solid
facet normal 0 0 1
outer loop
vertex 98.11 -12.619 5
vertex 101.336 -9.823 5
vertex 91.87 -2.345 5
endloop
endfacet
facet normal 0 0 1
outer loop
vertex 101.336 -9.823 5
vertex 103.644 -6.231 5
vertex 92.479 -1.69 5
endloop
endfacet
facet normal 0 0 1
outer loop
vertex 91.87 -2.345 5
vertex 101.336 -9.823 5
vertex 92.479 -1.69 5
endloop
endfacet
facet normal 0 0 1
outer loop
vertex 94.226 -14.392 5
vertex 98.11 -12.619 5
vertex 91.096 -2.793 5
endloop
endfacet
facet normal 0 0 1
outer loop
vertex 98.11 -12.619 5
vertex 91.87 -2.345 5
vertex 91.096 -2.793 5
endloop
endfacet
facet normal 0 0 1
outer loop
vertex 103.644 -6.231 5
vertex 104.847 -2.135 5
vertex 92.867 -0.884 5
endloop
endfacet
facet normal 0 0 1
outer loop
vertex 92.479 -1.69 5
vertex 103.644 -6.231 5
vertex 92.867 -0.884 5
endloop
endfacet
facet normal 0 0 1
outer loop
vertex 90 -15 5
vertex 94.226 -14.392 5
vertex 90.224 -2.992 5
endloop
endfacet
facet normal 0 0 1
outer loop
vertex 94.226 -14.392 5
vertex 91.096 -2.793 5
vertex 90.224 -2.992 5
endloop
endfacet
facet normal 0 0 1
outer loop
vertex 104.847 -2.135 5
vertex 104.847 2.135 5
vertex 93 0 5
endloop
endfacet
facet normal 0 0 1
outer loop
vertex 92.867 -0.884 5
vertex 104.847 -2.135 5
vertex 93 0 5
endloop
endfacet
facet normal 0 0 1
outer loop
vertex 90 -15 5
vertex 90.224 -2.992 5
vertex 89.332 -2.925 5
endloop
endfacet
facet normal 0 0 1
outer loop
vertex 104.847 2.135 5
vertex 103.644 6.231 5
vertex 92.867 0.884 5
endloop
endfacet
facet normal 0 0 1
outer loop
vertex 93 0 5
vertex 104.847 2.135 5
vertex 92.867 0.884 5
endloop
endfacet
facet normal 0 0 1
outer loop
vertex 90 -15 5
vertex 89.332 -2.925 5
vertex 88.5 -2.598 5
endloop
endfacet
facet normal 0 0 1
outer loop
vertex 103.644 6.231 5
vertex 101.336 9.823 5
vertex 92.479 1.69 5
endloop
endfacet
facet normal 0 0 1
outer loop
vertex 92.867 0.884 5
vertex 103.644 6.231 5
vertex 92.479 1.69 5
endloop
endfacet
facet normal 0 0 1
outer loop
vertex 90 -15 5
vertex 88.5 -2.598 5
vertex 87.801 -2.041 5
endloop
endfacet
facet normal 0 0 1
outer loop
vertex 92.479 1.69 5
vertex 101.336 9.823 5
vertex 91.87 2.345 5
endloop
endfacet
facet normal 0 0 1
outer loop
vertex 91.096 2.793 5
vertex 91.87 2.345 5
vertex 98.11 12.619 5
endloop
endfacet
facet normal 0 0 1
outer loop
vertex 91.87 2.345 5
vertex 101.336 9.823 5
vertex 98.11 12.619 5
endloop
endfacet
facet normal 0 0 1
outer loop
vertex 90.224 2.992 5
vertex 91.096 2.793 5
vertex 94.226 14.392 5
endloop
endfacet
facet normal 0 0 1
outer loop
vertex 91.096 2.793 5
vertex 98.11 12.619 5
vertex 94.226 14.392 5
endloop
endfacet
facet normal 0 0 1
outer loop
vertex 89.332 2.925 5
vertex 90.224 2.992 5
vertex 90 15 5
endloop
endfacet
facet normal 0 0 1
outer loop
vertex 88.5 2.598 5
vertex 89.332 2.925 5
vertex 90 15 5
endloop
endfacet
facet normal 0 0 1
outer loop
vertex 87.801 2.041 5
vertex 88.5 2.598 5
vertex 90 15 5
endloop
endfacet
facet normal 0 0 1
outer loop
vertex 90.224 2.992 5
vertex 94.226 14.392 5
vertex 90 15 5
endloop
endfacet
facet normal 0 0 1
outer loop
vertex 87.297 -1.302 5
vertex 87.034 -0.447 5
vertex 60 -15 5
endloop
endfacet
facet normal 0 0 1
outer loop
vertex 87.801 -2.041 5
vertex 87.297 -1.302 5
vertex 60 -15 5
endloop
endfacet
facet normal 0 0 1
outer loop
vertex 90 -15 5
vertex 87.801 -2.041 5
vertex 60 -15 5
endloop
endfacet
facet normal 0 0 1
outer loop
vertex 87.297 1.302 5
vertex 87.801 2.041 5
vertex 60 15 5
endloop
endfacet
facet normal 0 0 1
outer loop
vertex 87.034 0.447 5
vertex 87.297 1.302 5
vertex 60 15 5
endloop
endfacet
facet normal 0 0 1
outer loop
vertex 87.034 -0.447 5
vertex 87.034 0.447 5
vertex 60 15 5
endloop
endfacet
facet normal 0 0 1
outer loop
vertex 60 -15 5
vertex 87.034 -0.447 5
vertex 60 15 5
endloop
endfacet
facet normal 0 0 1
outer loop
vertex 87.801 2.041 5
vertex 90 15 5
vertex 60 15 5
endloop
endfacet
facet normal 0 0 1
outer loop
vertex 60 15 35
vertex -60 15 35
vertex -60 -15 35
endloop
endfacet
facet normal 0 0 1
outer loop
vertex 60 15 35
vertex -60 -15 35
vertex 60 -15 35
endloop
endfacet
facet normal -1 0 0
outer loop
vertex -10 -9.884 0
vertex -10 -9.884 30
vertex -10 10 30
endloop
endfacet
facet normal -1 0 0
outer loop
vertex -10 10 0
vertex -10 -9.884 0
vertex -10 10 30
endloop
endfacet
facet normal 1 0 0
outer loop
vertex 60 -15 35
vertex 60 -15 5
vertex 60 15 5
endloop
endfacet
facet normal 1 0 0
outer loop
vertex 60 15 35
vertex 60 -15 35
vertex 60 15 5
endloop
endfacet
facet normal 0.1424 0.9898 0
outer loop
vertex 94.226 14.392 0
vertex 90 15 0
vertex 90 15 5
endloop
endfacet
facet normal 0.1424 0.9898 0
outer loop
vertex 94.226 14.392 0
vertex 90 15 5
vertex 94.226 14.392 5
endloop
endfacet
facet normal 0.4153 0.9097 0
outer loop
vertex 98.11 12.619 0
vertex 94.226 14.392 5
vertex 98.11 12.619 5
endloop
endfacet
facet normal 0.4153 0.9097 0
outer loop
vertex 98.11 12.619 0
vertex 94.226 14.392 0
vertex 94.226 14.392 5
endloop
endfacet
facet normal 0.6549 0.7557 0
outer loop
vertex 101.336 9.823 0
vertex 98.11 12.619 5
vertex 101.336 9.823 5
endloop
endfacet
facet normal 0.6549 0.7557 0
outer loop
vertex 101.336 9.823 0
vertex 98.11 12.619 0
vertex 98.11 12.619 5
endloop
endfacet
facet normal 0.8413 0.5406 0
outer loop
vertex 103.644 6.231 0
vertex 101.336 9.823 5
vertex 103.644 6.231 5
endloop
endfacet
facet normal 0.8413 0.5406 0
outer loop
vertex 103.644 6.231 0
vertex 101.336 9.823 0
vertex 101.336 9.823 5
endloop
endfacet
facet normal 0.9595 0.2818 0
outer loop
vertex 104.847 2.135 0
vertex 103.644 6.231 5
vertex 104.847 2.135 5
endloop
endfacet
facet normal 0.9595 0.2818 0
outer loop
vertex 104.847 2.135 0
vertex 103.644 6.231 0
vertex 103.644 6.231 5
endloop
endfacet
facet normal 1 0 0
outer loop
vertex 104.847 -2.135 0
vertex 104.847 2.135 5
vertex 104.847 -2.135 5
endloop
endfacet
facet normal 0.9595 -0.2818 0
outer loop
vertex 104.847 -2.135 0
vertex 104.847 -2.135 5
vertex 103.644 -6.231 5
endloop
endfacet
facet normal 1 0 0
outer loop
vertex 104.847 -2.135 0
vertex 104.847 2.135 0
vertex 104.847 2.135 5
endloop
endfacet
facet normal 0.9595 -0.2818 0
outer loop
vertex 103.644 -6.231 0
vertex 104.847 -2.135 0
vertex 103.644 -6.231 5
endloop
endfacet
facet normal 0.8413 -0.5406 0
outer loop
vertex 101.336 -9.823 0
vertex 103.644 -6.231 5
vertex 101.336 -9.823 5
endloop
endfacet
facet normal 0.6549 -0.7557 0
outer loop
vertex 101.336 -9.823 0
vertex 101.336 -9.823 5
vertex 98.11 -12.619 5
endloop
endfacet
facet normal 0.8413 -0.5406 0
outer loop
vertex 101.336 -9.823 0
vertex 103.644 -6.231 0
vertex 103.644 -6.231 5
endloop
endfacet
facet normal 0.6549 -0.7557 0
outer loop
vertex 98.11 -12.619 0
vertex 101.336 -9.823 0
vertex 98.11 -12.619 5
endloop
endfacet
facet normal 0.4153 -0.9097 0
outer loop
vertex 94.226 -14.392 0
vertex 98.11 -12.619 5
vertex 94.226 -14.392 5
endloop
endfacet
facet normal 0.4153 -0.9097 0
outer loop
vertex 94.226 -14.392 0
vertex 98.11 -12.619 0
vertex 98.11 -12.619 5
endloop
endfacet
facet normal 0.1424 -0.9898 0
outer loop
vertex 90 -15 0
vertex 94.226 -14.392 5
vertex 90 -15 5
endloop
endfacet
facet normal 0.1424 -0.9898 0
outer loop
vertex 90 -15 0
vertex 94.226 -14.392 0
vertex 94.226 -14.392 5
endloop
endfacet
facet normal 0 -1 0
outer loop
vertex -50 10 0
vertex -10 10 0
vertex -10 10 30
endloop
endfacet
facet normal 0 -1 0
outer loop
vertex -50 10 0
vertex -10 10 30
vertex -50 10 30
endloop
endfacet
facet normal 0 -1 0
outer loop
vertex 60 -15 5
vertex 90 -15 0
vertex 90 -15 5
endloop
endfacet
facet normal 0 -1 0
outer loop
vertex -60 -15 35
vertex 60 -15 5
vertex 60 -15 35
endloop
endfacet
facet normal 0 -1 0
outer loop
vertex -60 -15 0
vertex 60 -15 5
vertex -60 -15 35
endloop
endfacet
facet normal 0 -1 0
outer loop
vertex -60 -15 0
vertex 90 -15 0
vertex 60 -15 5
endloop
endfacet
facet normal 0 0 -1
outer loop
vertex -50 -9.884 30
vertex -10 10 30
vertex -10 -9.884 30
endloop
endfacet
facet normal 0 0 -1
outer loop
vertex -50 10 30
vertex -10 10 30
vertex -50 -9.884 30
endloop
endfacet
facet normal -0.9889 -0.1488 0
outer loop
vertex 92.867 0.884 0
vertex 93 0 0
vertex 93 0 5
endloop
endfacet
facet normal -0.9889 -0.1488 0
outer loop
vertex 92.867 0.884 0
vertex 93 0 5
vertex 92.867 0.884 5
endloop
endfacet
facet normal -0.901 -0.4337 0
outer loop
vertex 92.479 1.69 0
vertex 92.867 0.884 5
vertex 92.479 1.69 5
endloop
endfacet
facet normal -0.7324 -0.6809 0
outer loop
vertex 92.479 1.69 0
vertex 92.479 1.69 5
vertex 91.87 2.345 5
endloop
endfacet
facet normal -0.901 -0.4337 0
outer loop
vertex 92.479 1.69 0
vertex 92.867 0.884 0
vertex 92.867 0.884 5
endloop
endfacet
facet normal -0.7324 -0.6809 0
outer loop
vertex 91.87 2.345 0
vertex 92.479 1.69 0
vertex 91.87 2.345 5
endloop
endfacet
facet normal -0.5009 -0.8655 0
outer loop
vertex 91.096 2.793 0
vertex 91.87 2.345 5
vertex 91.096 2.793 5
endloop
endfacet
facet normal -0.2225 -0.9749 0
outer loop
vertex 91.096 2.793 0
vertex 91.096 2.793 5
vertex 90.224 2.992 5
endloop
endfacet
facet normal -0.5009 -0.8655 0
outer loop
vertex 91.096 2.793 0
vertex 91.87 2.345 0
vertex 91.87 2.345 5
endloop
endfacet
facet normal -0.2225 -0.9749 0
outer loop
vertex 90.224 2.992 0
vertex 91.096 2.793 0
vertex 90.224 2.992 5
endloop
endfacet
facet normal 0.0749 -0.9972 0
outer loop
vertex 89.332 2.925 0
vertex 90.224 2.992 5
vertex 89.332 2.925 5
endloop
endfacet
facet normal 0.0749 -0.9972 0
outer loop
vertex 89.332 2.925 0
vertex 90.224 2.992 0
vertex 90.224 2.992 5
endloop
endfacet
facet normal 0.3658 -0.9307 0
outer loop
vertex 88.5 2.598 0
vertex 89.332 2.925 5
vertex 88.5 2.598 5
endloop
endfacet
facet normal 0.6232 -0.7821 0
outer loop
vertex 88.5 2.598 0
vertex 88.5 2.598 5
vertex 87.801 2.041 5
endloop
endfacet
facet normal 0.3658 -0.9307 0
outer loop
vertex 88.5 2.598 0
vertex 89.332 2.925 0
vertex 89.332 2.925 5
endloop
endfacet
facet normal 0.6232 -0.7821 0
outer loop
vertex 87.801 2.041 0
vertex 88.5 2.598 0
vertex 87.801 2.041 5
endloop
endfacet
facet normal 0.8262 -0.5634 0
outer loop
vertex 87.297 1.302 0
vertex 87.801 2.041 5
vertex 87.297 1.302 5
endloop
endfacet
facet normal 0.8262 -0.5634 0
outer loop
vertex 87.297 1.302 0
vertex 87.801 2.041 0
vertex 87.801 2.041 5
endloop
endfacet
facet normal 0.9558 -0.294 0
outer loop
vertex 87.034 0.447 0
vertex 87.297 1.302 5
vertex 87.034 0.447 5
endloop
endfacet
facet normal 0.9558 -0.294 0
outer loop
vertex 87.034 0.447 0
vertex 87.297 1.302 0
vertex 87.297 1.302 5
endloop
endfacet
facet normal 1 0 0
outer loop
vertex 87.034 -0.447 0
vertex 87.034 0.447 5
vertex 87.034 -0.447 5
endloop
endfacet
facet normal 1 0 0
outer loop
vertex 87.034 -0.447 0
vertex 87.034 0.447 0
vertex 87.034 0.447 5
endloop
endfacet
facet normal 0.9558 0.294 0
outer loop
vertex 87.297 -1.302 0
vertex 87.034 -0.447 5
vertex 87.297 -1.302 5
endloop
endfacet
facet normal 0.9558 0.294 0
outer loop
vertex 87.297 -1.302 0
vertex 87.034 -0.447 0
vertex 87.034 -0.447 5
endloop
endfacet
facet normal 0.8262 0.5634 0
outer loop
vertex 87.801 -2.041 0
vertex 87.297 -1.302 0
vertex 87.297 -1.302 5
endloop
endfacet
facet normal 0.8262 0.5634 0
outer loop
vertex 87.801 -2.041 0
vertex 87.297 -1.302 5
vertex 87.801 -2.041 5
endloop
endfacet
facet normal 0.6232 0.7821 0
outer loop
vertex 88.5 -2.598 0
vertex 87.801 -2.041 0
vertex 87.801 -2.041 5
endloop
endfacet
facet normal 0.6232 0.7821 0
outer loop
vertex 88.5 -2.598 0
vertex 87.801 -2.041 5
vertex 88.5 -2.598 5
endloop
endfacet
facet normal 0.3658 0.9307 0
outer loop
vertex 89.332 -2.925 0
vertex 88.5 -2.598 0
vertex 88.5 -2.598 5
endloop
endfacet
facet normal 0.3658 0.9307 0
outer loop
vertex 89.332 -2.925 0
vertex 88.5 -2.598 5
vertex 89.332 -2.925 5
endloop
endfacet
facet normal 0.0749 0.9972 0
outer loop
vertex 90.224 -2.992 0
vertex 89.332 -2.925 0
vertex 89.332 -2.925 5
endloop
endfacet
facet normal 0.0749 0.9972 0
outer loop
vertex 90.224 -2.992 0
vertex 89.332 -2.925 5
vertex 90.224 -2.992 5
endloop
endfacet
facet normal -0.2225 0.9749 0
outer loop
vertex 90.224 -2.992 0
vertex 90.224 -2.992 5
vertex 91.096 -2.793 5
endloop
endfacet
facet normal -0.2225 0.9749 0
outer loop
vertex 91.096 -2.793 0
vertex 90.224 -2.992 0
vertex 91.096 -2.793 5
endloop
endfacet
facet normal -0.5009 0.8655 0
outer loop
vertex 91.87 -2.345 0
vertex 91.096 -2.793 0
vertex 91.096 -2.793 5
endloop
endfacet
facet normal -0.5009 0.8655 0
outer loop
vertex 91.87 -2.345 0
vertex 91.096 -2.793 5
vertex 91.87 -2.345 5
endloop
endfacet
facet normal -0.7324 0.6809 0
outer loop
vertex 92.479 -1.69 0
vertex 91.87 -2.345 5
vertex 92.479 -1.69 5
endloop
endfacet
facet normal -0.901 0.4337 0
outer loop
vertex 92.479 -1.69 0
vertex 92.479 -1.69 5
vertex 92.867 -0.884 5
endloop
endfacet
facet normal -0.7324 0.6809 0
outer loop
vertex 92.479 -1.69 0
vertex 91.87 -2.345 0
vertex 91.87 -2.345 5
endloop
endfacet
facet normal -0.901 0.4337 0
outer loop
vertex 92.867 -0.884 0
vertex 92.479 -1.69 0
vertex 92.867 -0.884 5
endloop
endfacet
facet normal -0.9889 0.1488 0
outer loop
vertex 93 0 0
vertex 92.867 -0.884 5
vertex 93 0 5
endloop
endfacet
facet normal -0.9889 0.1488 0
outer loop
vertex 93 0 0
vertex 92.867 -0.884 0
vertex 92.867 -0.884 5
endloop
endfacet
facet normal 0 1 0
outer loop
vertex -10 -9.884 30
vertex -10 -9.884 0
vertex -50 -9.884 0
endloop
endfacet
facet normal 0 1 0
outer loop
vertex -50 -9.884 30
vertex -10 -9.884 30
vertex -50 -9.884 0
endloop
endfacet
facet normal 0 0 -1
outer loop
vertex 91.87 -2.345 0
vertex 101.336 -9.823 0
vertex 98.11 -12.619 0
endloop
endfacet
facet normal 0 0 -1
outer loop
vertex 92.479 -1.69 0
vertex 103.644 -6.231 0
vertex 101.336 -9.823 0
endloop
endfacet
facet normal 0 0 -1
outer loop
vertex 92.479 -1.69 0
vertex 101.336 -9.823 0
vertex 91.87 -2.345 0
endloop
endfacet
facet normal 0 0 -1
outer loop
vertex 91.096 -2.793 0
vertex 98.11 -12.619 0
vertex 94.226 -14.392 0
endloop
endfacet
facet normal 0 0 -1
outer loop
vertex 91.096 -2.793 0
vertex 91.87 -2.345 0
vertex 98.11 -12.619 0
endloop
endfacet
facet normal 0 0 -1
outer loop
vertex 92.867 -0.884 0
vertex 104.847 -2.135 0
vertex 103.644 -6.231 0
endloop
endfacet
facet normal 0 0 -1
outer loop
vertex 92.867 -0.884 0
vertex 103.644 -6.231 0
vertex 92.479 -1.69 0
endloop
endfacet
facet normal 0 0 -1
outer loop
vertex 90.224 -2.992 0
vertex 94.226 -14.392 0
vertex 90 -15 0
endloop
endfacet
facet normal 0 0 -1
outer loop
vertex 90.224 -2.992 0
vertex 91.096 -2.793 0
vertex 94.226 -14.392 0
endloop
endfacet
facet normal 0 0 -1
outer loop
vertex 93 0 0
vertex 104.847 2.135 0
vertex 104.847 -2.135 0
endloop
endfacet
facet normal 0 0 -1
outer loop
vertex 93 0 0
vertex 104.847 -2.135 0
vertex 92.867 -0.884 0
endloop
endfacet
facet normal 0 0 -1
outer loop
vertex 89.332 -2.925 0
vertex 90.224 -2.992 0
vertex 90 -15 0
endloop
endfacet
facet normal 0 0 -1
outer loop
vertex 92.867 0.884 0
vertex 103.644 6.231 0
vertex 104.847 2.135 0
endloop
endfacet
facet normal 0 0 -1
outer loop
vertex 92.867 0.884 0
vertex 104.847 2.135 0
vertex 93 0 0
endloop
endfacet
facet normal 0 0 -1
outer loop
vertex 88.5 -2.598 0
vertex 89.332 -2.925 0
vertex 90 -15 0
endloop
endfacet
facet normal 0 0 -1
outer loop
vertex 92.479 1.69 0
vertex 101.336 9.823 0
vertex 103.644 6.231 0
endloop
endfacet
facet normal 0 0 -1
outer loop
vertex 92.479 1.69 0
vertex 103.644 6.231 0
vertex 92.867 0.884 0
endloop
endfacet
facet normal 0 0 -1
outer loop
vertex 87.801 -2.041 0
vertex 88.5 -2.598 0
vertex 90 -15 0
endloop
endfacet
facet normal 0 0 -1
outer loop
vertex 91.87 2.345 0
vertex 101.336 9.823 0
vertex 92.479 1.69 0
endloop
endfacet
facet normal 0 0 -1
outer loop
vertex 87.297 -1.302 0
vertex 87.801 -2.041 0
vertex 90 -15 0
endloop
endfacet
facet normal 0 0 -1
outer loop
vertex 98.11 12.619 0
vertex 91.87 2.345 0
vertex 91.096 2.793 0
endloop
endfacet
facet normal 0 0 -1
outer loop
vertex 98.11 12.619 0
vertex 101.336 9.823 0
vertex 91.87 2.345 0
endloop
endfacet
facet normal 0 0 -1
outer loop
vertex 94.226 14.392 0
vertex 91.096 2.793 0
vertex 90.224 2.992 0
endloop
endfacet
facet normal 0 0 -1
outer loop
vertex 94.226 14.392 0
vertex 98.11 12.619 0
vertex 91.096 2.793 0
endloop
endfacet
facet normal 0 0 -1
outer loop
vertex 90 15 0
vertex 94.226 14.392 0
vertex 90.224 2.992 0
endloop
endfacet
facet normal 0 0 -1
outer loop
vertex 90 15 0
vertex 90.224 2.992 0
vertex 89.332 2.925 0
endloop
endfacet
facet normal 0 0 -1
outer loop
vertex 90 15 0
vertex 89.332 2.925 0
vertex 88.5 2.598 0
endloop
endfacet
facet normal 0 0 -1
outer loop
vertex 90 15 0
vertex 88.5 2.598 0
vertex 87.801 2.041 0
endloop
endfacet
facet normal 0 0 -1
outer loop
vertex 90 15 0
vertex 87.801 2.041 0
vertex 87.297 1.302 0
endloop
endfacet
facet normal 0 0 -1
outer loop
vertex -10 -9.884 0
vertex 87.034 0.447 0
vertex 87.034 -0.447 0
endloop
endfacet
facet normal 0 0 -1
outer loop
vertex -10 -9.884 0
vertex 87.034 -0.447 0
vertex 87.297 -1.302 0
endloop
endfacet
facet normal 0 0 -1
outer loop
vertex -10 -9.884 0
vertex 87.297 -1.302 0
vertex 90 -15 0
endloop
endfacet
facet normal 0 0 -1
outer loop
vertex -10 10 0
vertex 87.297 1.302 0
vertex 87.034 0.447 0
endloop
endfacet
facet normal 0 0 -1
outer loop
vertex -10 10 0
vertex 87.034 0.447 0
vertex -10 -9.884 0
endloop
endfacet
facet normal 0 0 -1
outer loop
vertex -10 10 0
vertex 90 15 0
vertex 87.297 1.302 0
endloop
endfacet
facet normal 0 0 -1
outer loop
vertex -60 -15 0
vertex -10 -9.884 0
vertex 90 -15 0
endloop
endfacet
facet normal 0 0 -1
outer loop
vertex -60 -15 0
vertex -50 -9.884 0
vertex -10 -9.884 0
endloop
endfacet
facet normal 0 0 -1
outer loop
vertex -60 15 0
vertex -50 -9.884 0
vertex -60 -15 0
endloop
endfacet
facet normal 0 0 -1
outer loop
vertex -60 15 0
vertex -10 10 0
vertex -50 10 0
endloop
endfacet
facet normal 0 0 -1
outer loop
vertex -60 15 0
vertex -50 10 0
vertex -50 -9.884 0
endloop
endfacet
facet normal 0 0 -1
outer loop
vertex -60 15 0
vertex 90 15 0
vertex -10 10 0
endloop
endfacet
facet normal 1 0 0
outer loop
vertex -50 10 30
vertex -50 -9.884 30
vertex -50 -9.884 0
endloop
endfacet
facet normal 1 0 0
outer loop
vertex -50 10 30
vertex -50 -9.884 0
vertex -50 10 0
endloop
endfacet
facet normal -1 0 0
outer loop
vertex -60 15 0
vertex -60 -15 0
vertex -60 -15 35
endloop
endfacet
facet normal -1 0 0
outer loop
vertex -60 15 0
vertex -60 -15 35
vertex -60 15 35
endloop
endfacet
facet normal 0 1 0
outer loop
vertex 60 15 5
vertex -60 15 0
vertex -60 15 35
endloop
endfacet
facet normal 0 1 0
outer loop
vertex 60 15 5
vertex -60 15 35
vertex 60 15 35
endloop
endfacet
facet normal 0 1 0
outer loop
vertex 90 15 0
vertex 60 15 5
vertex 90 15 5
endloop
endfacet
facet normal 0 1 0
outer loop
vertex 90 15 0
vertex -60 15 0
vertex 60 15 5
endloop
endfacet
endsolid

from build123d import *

# Parameters (mm, degrees)
SKETCH_1_W          = 120
SKETCH_1_H          = 30
EXTRUDE_2_DEPTH     = 35
SKETCH_1_8_R        = 3
EXTRUDE_3_DEPTH     = 5
SKETCH_2_W          = 40
SKETCH_2_H          = 19.883815918
CUT_EXTRUDE_1_DEPTH = 30


with BuildPart() as part:
    # 草图1 → 凸台-拉伸2 (new body)
    with BuildSketch(Plane.XY):
        Rectangle(SKETCH_1_W, SKETCH_1_H)
    extrude(amount=EXTRUDE_2_DEPTH)

    # 草图1<8> → 凸台-拉伸3 (add)
    with BuildSketch(Plane.XY):
        with BuildLine():
            Line((90, 15), (60, 15))
            Line((60, 15), (60, -15))
            Line((60, -15), (90, -15))
            ThreePointArc((90, -15), (105, 0), (90, 15))
        make_face()
        with Locations((90, 0)):
            Circle(SKETCH_1_8_R, mode=Mode.SUBTRACT)
    extrude(amount=EXTRUDE_3_DEPTH)

    # 草图2 → 切除-拉伸1 (cut)
    with BuildSketch(Plane(origin=(0, 0, 0), x_dir=(-1, 0, 0), z_dir=(0, 0, -1))):
        with Locations((30, 0.058092041)):
            Rectangle(SKETCH_2_W, SKETCH_2_H)
    extrude(amount=-CUT_EXTRUDE_1_DEPTH, mode=Mode.SUBTRACT)


solid = part.part
